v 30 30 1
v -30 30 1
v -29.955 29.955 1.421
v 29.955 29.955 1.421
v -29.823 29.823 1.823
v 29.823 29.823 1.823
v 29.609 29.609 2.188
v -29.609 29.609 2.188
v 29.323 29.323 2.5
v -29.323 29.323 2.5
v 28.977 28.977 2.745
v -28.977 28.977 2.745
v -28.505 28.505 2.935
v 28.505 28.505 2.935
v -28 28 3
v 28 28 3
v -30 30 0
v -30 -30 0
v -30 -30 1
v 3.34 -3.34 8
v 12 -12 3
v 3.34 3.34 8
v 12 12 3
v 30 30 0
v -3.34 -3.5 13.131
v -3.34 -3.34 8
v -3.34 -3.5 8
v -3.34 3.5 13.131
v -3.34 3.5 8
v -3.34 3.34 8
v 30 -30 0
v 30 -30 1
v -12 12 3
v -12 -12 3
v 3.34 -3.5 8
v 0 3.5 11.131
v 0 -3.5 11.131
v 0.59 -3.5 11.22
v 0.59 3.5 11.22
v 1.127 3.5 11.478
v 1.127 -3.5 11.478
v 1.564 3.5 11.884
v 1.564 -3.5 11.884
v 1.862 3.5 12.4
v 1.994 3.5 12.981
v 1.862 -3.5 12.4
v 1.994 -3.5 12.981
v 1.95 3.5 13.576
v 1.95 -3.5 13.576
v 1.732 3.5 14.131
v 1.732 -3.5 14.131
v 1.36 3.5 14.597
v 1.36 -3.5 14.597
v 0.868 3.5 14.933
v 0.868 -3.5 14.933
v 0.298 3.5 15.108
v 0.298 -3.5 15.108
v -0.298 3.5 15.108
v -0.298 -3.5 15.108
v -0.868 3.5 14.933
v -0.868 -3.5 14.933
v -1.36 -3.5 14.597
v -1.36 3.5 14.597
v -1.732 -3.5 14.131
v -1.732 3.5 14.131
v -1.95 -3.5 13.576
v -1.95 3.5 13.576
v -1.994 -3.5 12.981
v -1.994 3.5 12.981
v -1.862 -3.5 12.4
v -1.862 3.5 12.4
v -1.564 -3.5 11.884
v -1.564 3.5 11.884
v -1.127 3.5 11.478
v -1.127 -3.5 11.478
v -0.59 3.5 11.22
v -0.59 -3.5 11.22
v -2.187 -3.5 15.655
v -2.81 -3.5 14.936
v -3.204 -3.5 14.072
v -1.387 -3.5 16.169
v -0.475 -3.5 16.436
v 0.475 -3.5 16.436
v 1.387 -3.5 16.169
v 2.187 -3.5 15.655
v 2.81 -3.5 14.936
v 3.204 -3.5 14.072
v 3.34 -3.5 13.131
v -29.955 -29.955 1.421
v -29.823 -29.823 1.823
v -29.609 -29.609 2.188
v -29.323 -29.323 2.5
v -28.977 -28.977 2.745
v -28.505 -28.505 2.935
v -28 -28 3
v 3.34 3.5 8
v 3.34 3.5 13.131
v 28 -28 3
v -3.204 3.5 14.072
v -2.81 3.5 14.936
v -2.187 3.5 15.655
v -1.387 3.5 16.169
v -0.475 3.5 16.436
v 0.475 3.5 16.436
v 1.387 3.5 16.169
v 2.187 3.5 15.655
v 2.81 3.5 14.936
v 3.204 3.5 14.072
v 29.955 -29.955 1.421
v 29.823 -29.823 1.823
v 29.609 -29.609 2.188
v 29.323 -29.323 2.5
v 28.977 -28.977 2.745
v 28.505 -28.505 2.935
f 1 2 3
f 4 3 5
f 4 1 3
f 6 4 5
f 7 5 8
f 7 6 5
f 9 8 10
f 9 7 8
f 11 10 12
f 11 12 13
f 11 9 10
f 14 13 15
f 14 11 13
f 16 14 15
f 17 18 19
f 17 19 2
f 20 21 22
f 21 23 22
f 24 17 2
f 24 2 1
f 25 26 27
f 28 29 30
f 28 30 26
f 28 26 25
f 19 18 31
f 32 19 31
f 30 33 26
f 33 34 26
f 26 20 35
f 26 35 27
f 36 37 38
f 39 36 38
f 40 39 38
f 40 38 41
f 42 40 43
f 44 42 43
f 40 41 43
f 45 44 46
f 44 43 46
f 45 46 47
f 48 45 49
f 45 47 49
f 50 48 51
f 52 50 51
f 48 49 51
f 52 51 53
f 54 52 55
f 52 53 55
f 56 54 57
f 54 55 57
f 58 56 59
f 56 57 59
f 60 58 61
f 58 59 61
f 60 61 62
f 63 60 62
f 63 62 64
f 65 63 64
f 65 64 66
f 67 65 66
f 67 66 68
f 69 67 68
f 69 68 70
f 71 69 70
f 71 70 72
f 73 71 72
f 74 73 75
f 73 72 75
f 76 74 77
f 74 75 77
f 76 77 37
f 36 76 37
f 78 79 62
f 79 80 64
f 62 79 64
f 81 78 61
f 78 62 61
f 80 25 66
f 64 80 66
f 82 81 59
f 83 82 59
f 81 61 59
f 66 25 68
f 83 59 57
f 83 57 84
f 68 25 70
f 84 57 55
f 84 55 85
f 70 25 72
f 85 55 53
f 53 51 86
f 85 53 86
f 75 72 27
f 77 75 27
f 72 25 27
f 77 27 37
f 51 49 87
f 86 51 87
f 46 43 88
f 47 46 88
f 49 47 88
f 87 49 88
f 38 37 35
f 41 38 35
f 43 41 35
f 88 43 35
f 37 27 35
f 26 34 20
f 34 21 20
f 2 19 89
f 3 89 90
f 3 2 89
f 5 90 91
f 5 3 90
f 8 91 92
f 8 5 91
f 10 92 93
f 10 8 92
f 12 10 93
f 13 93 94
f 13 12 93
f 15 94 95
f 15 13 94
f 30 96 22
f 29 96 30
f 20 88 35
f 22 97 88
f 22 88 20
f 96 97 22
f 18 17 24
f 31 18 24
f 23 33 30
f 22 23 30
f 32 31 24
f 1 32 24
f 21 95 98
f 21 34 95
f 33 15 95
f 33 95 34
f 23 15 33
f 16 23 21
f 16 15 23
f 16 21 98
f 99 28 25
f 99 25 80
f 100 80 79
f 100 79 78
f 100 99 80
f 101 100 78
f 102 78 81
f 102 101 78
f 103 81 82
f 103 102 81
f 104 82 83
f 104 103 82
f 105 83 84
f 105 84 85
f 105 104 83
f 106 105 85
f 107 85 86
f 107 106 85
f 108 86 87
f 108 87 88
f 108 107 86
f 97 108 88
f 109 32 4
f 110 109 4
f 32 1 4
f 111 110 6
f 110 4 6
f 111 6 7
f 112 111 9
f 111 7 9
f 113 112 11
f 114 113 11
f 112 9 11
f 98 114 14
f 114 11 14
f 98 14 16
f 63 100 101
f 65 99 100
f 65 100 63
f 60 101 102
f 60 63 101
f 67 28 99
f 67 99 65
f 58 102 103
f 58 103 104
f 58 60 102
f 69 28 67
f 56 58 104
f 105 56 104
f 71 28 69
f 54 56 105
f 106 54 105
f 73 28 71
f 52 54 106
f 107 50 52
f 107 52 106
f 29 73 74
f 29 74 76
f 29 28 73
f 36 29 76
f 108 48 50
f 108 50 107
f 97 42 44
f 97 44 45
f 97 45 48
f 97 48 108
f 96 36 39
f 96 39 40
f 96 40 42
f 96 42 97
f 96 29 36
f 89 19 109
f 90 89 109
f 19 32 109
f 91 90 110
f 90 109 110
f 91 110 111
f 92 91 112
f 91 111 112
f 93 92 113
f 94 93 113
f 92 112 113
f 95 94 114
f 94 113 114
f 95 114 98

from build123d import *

# Parameters (mm, degrees)
CROQUIS1_W              = 60
CROQUIS1_H              = 60
SALIENTE_EXTRUIR1_DEPTH = 3
REDONDEO1_R             = 2
CROQUIS2_W              = 24
CROQUIS2_H              = 24
SALIENTE_EXTRUIR2_DEPTH = 5
SALIENTE_EXTRUIR2_TAPER = 60
SALIENTE_EXTRUIR3_DEPTH = 3.5
CROQUIS7_R              = 2
CORTAR_EXTRUIR1_DEPTH   = 7


with BuildPart() as part:
    # Croquis1 → Saliente-Extruir1 (new body)
    with BuildSketch(Plane.XY):
        Rectangle(CROQUIS1_W, CROQUIS1_H)
    extrude(amount=SALIENTE_EXTRUIR1_DEPTH)

    # Redondeo1
    redondeo1_edges = [part.edges().sort_by_distance(p)[0] for p in [
        (0, -30, 3),
        (-30, 0, 3),
        (30, 0, 3),
        (0, 30, 3),
    ]]
    fillet(redondeo1_edges, radius=REDONDEO1_R)

    # Croquis2 → Saliente-Extruir2 (add)
    with BuildSketch(Plane.XY.offset(3)):
        Rectangle(CROQUIS2_W, CROQUIS2_H)
    extrude(amount=SALIENTE_EXTRUIR2_DEPTH, taper=SALIENTE_EXTRUIR2_TAPER)

    # Croquis6 → Saliente-Extruir3 (add, symmetric)
    with BuildSketch(Plane(origin=(0, 0, 0), x_dir=(1, 0, 0), z_dir=(0, 1, 0))):
        with BuildLine():
            Line((-3.339745962, -8), (-3.339745962, -13.130693005))
            ThreePointArc((-3.339745962, -13.130693005), (0, -16.470438967), (3.339745962, -13.130693005))
            Line((3.339745962, -13.130693005), (3.339745962, -8))
            Line((3.339745962, -8), (-3.339745962, -8))
        make_face()
    extrude(amount=SALIENTE_EXTRUIR3_DEPTH, both=True)

    # Croquis7 → Cortar-Extruir1 (cut)
    with BuildSketch(Plane.XZ.offset(3.5)):
        with Locations((0, 13.130693005)):
            Circle(CROQUIS7_R)
    extrude(amount=-CORTAR_EXTRUIR1_DEPTH, mode=Mode.SUBTRACT)


solid = part.part
